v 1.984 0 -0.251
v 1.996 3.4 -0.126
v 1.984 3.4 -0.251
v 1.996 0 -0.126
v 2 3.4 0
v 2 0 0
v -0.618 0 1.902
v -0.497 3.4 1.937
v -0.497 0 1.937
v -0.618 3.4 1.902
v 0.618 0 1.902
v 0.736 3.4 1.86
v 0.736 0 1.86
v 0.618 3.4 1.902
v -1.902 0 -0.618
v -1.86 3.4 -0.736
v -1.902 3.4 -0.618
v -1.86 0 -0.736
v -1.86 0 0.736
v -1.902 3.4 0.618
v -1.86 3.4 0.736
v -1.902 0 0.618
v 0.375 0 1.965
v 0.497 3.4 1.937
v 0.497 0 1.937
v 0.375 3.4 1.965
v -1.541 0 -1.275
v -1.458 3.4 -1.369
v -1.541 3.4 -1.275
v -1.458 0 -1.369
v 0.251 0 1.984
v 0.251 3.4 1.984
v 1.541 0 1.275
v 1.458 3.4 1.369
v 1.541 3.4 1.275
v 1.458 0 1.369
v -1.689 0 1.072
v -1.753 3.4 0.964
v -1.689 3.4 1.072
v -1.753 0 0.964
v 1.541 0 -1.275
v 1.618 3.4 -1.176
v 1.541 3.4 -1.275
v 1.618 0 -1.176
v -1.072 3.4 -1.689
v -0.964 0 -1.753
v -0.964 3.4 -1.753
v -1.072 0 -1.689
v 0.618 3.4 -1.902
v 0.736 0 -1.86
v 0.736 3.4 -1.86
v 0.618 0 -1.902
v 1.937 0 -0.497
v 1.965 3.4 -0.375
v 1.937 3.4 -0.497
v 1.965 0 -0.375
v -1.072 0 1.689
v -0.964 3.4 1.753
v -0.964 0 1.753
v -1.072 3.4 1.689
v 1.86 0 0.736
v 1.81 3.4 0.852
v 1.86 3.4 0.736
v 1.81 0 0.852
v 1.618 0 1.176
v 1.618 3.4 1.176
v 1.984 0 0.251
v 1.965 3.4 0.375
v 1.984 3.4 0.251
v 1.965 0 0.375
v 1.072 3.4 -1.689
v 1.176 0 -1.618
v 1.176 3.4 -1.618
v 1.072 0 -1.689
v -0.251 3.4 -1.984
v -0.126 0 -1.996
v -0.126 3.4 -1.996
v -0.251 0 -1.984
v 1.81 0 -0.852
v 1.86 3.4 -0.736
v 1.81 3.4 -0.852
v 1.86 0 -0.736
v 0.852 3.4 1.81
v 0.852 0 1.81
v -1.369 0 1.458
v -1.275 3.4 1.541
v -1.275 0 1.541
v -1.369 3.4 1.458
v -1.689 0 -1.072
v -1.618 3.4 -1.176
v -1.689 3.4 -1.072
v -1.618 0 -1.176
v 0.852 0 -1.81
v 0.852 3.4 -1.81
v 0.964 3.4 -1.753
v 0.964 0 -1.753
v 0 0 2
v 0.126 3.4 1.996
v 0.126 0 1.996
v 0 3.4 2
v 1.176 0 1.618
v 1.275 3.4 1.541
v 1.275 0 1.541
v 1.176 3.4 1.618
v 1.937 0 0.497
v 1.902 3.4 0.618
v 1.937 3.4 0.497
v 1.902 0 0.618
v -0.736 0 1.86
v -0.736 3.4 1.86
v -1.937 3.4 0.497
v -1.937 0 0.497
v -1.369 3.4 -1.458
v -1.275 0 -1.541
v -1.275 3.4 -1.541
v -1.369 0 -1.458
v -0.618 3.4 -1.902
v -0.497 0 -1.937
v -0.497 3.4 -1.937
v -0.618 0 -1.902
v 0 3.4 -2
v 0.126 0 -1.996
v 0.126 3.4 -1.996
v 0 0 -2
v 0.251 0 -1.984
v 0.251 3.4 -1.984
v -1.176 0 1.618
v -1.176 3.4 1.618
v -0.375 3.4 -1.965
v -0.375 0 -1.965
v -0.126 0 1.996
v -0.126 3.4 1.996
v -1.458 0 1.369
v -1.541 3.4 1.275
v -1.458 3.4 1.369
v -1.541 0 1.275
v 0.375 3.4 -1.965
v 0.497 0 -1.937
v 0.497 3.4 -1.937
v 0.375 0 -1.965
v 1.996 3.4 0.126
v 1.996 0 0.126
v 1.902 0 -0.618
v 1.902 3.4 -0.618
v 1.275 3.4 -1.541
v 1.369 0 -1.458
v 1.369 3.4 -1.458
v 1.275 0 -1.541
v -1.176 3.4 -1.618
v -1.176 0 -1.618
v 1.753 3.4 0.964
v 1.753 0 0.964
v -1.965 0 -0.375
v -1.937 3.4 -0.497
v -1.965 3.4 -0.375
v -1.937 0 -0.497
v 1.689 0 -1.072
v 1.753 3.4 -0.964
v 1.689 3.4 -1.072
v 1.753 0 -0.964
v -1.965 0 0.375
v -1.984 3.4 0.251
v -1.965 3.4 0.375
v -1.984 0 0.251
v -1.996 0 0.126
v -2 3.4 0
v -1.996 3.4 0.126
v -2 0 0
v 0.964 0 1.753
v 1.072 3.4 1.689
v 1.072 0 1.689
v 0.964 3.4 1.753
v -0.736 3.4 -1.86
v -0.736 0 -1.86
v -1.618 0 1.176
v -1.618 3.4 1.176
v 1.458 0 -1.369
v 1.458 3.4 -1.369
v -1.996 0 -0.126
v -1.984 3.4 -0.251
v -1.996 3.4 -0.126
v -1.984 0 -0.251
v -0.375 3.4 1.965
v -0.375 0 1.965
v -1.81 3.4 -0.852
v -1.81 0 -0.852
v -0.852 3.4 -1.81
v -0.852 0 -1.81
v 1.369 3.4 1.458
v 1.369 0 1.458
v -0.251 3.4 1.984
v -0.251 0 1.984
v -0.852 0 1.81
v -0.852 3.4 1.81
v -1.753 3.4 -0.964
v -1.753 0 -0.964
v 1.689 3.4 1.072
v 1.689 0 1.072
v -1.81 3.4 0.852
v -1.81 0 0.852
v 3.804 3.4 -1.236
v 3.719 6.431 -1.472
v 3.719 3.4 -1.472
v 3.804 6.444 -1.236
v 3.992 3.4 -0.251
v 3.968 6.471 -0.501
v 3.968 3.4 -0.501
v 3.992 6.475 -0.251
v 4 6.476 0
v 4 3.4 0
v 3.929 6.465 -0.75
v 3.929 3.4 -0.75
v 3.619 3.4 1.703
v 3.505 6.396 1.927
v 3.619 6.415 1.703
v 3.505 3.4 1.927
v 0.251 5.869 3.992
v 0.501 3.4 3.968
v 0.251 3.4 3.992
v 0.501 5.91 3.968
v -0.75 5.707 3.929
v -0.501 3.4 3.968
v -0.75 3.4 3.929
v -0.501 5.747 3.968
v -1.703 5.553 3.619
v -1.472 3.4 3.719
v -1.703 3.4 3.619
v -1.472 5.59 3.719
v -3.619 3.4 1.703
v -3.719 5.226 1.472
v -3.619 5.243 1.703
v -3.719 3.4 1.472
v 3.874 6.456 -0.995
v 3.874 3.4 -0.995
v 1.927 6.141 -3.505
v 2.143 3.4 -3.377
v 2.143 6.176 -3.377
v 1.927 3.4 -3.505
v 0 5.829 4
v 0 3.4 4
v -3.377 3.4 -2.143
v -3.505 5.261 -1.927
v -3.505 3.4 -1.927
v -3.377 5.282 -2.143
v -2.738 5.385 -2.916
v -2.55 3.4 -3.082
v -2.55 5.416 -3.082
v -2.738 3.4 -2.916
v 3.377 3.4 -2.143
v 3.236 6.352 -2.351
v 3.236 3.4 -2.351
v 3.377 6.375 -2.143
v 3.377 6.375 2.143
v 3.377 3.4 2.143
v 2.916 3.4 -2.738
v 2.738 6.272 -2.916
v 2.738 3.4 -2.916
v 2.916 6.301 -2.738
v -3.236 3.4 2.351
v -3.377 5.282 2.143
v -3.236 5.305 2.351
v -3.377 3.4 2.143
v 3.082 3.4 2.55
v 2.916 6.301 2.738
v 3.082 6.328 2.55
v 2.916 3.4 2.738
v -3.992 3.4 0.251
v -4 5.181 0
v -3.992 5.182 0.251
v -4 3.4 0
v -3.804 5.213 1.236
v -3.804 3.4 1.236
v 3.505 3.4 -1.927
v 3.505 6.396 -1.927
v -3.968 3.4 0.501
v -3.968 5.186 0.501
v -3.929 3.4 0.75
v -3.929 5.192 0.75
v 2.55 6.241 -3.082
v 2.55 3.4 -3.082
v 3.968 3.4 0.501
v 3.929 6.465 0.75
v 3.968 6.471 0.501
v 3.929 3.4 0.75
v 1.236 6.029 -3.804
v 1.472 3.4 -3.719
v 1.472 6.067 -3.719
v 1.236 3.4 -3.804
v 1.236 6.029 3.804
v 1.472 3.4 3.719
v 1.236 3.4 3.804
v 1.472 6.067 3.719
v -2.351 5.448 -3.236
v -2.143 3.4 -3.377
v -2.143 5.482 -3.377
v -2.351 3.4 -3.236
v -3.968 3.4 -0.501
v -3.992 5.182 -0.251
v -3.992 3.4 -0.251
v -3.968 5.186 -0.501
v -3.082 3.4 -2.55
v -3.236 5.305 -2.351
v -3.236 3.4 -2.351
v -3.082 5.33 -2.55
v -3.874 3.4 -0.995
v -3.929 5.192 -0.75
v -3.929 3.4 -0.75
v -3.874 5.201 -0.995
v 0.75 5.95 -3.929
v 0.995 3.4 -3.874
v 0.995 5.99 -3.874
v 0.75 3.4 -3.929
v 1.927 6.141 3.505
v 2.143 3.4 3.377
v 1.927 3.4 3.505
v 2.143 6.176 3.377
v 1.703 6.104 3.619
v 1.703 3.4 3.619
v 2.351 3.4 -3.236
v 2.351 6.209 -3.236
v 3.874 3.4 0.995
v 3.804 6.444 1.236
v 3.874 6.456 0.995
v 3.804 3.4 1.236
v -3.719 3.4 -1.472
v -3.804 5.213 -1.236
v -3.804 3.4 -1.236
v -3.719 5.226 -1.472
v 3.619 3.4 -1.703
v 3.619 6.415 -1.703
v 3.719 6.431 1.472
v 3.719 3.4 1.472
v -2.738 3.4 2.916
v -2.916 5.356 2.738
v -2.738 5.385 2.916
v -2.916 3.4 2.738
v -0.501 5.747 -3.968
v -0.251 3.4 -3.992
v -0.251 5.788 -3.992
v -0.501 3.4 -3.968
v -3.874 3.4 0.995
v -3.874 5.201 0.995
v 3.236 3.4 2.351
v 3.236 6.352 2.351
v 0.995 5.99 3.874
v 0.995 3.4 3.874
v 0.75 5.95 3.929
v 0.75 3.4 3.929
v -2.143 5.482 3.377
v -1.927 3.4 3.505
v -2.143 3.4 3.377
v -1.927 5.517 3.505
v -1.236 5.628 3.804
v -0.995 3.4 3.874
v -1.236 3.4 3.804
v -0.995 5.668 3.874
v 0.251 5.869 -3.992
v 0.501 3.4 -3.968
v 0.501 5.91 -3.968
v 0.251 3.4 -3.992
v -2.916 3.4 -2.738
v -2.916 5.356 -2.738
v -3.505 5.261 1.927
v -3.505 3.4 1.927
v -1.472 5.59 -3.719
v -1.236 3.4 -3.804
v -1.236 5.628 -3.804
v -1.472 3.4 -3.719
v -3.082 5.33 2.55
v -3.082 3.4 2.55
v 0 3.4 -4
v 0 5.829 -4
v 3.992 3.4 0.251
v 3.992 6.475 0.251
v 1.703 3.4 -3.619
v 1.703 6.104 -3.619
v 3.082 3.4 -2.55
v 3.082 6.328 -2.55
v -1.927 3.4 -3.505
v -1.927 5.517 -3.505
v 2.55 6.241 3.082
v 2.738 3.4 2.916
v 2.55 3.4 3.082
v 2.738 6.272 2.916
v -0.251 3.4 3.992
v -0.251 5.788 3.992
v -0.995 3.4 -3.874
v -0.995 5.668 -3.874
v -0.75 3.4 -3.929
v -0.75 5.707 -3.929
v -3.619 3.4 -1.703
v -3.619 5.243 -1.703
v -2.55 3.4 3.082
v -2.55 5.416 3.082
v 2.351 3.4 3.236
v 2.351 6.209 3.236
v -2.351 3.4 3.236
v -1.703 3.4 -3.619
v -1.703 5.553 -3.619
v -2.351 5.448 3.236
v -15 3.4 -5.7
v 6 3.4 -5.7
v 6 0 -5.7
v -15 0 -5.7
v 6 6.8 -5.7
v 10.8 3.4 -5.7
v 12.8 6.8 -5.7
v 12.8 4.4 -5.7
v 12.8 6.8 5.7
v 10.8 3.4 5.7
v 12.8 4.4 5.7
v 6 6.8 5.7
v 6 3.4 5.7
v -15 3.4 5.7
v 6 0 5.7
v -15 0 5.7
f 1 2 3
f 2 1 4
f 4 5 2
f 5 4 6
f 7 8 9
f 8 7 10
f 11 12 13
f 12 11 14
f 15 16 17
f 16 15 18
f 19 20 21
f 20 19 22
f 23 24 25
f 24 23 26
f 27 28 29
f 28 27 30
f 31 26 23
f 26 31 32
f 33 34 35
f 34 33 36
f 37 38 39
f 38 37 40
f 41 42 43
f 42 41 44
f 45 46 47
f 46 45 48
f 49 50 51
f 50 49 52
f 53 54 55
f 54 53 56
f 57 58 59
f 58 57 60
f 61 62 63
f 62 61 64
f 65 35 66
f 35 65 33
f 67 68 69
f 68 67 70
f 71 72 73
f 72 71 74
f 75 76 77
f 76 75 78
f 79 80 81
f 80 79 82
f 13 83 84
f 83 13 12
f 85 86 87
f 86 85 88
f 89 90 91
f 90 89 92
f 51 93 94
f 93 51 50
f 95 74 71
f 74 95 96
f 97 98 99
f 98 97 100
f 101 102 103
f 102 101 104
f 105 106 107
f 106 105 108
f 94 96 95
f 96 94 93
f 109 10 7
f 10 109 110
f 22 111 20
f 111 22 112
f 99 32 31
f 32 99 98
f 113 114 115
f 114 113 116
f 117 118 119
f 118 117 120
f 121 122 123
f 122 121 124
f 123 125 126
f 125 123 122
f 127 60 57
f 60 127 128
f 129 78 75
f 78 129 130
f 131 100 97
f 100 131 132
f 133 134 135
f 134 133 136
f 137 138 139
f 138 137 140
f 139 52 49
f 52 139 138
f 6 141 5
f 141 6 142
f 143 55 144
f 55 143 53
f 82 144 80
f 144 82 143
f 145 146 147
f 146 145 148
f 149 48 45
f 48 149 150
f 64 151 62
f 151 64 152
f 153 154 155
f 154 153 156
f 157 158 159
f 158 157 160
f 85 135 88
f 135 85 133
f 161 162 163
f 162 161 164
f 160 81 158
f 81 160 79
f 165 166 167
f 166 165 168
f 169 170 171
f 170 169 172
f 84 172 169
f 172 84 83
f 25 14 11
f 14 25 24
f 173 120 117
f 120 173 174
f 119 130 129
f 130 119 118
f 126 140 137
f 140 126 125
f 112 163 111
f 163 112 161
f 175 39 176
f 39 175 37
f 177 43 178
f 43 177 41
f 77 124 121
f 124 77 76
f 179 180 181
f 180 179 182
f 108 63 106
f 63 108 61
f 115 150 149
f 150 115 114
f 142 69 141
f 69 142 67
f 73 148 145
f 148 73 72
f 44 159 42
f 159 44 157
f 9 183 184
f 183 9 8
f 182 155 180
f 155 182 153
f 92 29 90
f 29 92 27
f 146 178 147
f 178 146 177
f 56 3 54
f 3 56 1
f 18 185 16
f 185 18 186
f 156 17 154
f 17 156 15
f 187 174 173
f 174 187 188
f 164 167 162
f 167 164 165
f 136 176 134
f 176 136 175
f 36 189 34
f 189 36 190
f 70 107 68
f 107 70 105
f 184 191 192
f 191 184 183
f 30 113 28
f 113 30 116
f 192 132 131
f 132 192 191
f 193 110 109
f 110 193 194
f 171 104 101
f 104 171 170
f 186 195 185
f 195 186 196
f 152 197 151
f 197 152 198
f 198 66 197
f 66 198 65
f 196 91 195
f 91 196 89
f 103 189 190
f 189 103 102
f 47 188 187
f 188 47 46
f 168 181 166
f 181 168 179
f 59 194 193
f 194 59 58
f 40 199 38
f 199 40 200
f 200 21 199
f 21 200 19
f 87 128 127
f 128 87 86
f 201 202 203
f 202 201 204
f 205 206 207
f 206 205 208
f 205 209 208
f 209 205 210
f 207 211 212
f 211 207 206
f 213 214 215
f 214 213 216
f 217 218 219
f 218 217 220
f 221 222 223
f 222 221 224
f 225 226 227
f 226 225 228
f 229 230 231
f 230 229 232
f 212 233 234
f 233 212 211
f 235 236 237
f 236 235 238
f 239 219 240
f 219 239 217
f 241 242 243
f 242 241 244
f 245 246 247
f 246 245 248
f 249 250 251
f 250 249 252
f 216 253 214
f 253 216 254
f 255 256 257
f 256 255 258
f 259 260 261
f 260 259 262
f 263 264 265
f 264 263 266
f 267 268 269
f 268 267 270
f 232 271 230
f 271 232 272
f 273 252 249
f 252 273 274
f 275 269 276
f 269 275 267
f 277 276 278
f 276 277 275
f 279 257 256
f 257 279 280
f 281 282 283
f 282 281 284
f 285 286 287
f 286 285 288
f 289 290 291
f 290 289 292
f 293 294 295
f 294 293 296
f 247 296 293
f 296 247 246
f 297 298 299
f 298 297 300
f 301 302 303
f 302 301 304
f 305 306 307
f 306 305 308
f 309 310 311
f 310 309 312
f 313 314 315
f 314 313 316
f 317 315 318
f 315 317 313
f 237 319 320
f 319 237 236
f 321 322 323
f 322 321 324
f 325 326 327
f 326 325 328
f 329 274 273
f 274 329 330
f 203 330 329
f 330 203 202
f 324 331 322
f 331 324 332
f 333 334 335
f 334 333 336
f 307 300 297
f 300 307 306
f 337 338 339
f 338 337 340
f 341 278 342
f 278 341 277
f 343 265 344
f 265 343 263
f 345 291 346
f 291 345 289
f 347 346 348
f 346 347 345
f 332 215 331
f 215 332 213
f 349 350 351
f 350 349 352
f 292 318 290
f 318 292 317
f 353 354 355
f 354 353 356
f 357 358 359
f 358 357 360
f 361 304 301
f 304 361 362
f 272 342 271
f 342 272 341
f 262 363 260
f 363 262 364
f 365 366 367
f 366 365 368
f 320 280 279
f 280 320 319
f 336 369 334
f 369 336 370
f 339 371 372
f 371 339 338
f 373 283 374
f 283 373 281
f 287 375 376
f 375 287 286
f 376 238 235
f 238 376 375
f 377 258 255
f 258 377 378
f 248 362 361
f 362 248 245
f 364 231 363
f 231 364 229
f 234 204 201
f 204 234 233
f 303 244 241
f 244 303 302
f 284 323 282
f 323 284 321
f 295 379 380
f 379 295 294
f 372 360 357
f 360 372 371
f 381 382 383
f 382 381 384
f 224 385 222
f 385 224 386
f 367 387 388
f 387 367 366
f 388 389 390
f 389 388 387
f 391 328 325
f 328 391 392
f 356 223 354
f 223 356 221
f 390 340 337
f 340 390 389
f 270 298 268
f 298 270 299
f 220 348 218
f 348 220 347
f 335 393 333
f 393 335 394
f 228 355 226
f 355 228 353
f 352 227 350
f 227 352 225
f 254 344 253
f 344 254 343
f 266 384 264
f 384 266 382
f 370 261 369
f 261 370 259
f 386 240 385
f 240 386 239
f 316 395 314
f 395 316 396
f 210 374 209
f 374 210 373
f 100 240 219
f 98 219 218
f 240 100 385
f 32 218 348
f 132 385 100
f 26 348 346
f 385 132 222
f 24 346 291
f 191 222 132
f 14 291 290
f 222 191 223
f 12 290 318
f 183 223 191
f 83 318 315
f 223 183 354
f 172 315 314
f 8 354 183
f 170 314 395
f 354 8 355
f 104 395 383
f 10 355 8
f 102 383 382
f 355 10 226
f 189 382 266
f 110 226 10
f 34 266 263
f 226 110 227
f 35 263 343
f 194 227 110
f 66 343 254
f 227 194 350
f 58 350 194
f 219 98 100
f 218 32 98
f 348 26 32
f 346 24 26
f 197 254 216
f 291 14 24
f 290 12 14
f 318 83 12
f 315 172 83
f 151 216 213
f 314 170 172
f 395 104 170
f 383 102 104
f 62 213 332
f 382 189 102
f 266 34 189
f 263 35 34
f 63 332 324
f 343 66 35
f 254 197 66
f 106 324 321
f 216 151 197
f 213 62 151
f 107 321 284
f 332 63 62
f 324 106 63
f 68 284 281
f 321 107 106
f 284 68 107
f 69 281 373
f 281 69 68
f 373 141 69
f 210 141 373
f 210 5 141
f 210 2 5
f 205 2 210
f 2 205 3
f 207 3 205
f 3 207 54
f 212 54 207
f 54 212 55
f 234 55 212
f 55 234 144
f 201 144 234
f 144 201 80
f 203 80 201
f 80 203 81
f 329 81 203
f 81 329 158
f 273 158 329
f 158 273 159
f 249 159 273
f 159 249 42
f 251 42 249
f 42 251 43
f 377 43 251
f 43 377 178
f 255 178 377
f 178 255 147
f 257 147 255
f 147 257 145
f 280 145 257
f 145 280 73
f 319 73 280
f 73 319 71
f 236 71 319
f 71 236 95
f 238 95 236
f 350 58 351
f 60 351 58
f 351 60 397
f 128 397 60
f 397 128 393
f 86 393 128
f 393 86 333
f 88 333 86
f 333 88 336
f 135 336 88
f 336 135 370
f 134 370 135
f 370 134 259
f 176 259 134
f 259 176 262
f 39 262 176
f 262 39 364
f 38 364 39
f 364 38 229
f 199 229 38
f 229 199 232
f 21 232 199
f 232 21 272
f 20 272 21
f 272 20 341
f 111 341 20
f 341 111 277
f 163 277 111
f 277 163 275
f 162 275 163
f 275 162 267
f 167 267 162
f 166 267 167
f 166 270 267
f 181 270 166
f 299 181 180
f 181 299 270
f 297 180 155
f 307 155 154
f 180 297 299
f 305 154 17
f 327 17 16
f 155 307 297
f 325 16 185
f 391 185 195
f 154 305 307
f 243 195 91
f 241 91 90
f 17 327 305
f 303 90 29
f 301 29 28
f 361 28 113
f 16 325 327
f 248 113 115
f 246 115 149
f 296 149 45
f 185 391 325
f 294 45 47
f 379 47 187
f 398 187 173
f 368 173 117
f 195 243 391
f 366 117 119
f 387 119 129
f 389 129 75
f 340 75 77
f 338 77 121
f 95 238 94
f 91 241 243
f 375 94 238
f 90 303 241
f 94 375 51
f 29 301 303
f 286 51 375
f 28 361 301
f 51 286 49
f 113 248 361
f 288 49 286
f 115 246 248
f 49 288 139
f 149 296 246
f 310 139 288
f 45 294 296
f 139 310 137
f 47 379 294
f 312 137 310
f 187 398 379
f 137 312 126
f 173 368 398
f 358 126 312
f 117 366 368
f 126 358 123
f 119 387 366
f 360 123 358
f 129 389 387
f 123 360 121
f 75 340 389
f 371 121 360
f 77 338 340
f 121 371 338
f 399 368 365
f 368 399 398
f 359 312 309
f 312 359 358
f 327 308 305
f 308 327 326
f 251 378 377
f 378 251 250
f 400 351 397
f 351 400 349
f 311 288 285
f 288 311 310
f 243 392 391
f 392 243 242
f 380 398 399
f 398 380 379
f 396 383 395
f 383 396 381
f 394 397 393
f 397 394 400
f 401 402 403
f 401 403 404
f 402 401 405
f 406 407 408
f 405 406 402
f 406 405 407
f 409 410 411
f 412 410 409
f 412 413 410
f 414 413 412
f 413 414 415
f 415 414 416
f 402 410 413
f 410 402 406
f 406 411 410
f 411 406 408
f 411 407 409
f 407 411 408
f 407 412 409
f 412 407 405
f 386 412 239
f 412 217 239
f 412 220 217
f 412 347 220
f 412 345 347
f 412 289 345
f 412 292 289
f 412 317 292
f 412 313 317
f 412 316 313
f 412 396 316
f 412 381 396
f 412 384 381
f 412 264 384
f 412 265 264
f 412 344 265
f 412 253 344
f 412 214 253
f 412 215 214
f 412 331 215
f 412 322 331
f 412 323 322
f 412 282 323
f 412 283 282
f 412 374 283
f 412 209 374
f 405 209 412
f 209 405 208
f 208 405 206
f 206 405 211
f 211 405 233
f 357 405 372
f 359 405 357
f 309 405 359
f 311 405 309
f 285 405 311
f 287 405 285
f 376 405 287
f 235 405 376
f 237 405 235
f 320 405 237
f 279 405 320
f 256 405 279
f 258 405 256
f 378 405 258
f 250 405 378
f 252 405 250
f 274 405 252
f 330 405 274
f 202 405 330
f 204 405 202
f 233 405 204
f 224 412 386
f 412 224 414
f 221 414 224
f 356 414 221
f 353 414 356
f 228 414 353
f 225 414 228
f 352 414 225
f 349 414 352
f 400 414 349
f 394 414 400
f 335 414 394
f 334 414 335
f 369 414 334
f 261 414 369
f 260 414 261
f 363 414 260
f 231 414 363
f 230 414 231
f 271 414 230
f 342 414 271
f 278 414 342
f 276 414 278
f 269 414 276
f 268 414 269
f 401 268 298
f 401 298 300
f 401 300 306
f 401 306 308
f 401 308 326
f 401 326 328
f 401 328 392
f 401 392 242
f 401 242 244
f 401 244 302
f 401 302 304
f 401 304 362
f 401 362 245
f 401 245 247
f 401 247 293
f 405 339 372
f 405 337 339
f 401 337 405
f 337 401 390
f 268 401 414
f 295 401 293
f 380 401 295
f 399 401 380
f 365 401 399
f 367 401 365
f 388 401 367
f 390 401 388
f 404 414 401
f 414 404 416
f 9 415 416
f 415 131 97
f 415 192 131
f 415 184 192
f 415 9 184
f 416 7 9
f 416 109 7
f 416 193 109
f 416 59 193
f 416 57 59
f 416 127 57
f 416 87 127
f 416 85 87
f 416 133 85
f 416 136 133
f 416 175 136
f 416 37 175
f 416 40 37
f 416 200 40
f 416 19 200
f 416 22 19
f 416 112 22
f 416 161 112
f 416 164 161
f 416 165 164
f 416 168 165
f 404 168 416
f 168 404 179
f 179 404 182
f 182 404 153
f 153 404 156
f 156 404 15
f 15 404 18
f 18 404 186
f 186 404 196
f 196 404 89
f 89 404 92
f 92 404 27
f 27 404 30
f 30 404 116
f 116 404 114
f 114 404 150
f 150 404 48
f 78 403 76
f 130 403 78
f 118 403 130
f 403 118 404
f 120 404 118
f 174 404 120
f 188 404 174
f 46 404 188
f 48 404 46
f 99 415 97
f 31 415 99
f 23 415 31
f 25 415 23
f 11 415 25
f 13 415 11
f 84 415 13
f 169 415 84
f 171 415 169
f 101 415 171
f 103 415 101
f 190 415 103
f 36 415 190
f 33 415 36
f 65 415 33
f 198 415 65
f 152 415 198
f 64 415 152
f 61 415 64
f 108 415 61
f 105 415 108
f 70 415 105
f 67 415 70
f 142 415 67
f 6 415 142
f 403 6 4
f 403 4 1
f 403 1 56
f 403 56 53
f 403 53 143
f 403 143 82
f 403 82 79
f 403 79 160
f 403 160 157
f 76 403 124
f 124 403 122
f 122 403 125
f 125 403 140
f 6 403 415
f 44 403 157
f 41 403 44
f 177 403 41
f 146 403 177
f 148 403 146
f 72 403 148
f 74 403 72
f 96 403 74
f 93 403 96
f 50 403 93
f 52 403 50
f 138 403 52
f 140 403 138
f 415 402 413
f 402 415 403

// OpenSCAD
L = 11.4;
l1 = 6;
l2 = 15;
e = 3.4;
d = 4;
D = 8;

difference() {
	linear_extrude(height = L, center = true) 
		polygon([
		  [l1,0],
		  [l1,e],
		  [l1+2*e-2, e],
		  [l1+2*e, e+1],
		  [l1+2*e, 2*e],
		  [l1, 2*e],
		  [-l2, e],
		  [-l2, 0]
		], 1);

	rotate([-90,0,0]) {
		cylinder (h = 3*e, d=d, center = true, $fn=100);
		translate([0,0,e])
			cylinder (h = 3*e, d=D, $fn=100);
	}
}
